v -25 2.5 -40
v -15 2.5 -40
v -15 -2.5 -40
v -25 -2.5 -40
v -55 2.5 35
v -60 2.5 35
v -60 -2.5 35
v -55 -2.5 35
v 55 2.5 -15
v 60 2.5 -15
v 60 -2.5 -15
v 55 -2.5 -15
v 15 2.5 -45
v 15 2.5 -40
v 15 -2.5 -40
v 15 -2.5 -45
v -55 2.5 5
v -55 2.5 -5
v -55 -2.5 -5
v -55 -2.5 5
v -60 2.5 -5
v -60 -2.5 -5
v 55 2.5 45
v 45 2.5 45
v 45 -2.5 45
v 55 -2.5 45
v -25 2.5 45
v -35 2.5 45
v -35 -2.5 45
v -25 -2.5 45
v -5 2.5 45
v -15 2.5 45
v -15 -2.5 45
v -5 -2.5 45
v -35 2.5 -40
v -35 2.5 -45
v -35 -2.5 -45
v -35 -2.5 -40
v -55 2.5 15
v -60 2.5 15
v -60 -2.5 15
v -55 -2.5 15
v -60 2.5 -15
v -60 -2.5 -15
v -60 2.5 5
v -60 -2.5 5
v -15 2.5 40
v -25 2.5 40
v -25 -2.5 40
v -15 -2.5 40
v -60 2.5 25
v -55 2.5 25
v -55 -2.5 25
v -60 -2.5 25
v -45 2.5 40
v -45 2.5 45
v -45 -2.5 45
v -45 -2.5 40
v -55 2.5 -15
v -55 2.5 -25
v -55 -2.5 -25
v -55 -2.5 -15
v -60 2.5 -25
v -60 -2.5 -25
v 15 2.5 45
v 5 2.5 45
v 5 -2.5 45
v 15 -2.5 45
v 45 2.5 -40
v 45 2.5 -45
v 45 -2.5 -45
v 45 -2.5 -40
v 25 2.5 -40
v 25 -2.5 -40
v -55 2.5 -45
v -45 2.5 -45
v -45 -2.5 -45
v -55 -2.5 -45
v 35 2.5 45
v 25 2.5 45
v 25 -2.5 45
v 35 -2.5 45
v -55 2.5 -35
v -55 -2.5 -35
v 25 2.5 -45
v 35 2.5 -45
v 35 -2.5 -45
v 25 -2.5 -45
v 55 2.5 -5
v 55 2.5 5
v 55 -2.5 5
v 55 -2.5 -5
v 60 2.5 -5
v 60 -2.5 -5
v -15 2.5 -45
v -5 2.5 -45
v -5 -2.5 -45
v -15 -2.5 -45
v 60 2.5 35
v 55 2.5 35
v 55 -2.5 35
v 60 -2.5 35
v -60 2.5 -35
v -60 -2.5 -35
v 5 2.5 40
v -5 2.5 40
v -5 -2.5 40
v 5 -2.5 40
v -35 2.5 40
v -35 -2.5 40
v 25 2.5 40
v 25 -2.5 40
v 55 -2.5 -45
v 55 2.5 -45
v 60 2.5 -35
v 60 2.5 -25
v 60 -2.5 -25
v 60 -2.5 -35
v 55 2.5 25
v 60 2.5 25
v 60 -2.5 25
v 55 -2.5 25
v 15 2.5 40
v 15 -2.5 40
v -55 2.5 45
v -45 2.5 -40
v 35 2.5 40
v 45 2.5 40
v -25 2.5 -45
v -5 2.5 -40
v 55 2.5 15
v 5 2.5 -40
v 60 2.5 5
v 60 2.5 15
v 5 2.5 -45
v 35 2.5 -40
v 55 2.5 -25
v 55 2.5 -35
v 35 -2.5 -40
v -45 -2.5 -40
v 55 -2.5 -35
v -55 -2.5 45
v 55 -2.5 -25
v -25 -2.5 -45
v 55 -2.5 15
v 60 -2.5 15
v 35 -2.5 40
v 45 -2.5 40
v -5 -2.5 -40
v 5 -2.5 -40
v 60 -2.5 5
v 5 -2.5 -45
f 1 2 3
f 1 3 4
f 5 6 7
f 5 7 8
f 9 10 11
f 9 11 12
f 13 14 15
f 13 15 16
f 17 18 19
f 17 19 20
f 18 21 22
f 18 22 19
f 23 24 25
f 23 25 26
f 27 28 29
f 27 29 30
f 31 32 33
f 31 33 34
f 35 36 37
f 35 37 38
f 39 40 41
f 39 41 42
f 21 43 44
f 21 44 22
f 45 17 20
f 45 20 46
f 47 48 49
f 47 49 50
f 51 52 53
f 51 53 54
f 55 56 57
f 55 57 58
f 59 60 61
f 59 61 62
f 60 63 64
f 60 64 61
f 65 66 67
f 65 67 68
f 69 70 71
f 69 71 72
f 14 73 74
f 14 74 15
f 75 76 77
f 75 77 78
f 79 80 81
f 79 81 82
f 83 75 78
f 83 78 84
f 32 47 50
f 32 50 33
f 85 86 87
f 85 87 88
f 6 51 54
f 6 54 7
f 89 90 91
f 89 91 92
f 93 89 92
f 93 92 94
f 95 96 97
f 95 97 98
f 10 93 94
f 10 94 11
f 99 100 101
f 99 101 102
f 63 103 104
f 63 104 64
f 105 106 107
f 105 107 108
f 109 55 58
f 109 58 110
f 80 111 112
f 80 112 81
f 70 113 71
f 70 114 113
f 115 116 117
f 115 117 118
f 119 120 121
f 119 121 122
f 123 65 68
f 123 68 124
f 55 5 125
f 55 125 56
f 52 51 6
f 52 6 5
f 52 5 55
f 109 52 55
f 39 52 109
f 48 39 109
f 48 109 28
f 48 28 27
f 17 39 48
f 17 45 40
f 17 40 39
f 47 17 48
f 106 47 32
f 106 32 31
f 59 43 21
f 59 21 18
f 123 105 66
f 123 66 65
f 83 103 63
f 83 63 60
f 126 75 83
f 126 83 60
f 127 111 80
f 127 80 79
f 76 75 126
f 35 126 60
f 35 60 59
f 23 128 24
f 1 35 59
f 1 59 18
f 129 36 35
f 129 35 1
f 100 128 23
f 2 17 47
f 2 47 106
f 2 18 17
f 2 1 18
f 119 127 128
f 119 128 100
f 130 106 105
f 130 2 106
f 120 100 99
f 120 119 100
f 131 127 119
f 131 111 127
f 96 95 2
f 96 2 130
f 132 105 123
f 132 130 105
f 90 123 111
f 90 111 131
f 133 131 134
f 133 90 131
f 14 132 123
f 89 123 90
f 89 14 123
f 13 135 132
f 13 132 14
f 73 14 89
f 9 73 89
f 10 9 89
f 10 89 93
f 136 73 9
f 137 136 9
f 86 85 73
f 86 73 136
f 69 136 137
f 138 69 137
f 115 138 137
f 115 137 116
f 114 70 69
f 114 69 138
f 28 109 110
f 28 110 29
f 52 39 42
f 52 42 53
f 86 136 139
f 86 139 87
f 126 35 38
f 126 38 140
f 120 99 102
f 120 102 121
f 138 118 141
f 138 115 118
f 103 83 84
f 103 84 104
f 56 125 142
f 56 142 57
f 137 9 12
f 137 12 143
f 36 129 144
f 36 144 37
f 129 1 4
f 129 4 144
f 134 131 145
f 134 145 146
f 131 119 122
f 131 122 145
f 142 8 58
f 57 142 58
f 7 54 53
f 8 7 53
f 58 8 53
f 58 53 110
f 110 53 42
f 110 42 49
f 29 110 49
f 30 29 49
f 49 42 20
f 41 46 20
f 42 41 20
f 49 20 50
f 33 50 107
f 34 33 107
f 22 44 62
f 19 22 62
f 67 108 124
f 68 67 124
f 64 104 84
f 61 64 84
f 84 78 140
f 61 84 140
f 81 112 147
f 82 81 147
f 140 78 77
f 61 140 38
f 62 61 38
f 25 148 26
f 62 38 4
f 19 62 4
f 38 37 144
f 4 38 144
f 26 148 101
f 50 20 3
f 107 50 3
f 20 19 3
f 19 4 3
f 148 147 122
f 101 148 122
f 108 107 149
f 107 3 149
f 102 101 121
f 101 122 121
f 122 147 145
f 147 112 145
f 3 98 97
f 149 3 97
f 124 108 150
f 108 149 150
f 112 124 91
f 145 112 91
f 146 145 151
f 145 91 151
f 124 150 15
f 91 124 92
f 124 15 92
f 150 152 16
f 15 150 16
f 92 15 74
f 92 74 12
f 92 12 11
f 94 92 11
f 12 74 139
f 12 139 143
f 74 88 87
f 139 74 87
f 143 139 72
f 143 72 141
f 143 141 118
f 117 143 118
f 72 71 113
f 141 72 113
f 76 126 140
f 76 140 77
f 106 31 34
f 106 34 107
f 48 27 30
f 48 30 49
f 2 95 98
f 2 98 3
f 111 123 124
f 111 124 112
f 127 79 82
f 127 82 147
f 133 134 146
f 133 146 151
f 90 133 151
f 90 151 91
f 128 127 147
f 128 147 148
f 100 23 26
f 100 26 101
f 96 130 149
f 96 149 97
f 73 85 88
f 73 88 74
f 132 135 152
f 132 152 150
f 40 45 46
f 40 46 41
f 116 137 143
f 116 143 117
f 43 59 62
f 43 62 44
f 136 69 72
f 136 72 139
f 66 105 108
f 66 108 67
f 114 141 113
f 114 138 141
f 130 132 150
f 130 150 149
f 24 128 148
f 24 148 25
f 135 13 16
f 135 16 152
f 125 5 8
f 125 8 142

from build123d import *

# Parameters (mm, degrees)
BOSS_EXTRUDE1_DEPTH = 2.5


with BuildPart() as part:
    # Sketch1 → Boss-Extrude1 (new, symmetric)
    with BuildSketch(Plane(origin=(0, 0, 0), x_dir=(1, 0, 0), z_dir=(0, 1, 0))):
        Polygon((55, 45), (45, 45), (45, 40), (35, 40), (35, 45), (25, 45), (25, 40), (15, 40), (15, 45), (5, 45), (5, 40), (-5, 40), (-5, 45), (-15, 45), (-15, 40), (-25, 40), (-25, 45), (-35, 45), (-35, 40), (-45, 40), (-45, 45), (-55, 45), (-55, 40), (-55, 35), (-60, 35), (-60, 25), (-55, 25), (-55, 15), (-60, 15), (-60, 5), (-55, 5), (-55, -5), (-60, -5), (-60, -15), (-55, -15), (-55, -25), (-60, -25), (-60, -35), (-55, -35), (-55, -40), (-55, -45), (-45, -45), (-45, -40), (-35, -40), (-35, -45), (-25, -45), (-25, -40), (-15, -40), (-15, -45), (-5, -45), (-5, -40), (5, -40), (5, -45), (15, -45), (15, -40), (25, -40), (25, -45), (35, -45), (35, -40), (45, -40), (45, -45), (55, -45), (55, -40), (55, -35), (60, -35), (60, -25), (55, -25), (55, -15), (60, -15), (60, -5), (55, -5), (55, 5), (60, 5), (60, 15), (55, 15), (55, 25), (60, 25), (60, 35), (55, 35), (55, 40), align=None)
    extrude(amount=BOSS_EXTRUDE1_DEPTH, both=True)


solid = part.part
